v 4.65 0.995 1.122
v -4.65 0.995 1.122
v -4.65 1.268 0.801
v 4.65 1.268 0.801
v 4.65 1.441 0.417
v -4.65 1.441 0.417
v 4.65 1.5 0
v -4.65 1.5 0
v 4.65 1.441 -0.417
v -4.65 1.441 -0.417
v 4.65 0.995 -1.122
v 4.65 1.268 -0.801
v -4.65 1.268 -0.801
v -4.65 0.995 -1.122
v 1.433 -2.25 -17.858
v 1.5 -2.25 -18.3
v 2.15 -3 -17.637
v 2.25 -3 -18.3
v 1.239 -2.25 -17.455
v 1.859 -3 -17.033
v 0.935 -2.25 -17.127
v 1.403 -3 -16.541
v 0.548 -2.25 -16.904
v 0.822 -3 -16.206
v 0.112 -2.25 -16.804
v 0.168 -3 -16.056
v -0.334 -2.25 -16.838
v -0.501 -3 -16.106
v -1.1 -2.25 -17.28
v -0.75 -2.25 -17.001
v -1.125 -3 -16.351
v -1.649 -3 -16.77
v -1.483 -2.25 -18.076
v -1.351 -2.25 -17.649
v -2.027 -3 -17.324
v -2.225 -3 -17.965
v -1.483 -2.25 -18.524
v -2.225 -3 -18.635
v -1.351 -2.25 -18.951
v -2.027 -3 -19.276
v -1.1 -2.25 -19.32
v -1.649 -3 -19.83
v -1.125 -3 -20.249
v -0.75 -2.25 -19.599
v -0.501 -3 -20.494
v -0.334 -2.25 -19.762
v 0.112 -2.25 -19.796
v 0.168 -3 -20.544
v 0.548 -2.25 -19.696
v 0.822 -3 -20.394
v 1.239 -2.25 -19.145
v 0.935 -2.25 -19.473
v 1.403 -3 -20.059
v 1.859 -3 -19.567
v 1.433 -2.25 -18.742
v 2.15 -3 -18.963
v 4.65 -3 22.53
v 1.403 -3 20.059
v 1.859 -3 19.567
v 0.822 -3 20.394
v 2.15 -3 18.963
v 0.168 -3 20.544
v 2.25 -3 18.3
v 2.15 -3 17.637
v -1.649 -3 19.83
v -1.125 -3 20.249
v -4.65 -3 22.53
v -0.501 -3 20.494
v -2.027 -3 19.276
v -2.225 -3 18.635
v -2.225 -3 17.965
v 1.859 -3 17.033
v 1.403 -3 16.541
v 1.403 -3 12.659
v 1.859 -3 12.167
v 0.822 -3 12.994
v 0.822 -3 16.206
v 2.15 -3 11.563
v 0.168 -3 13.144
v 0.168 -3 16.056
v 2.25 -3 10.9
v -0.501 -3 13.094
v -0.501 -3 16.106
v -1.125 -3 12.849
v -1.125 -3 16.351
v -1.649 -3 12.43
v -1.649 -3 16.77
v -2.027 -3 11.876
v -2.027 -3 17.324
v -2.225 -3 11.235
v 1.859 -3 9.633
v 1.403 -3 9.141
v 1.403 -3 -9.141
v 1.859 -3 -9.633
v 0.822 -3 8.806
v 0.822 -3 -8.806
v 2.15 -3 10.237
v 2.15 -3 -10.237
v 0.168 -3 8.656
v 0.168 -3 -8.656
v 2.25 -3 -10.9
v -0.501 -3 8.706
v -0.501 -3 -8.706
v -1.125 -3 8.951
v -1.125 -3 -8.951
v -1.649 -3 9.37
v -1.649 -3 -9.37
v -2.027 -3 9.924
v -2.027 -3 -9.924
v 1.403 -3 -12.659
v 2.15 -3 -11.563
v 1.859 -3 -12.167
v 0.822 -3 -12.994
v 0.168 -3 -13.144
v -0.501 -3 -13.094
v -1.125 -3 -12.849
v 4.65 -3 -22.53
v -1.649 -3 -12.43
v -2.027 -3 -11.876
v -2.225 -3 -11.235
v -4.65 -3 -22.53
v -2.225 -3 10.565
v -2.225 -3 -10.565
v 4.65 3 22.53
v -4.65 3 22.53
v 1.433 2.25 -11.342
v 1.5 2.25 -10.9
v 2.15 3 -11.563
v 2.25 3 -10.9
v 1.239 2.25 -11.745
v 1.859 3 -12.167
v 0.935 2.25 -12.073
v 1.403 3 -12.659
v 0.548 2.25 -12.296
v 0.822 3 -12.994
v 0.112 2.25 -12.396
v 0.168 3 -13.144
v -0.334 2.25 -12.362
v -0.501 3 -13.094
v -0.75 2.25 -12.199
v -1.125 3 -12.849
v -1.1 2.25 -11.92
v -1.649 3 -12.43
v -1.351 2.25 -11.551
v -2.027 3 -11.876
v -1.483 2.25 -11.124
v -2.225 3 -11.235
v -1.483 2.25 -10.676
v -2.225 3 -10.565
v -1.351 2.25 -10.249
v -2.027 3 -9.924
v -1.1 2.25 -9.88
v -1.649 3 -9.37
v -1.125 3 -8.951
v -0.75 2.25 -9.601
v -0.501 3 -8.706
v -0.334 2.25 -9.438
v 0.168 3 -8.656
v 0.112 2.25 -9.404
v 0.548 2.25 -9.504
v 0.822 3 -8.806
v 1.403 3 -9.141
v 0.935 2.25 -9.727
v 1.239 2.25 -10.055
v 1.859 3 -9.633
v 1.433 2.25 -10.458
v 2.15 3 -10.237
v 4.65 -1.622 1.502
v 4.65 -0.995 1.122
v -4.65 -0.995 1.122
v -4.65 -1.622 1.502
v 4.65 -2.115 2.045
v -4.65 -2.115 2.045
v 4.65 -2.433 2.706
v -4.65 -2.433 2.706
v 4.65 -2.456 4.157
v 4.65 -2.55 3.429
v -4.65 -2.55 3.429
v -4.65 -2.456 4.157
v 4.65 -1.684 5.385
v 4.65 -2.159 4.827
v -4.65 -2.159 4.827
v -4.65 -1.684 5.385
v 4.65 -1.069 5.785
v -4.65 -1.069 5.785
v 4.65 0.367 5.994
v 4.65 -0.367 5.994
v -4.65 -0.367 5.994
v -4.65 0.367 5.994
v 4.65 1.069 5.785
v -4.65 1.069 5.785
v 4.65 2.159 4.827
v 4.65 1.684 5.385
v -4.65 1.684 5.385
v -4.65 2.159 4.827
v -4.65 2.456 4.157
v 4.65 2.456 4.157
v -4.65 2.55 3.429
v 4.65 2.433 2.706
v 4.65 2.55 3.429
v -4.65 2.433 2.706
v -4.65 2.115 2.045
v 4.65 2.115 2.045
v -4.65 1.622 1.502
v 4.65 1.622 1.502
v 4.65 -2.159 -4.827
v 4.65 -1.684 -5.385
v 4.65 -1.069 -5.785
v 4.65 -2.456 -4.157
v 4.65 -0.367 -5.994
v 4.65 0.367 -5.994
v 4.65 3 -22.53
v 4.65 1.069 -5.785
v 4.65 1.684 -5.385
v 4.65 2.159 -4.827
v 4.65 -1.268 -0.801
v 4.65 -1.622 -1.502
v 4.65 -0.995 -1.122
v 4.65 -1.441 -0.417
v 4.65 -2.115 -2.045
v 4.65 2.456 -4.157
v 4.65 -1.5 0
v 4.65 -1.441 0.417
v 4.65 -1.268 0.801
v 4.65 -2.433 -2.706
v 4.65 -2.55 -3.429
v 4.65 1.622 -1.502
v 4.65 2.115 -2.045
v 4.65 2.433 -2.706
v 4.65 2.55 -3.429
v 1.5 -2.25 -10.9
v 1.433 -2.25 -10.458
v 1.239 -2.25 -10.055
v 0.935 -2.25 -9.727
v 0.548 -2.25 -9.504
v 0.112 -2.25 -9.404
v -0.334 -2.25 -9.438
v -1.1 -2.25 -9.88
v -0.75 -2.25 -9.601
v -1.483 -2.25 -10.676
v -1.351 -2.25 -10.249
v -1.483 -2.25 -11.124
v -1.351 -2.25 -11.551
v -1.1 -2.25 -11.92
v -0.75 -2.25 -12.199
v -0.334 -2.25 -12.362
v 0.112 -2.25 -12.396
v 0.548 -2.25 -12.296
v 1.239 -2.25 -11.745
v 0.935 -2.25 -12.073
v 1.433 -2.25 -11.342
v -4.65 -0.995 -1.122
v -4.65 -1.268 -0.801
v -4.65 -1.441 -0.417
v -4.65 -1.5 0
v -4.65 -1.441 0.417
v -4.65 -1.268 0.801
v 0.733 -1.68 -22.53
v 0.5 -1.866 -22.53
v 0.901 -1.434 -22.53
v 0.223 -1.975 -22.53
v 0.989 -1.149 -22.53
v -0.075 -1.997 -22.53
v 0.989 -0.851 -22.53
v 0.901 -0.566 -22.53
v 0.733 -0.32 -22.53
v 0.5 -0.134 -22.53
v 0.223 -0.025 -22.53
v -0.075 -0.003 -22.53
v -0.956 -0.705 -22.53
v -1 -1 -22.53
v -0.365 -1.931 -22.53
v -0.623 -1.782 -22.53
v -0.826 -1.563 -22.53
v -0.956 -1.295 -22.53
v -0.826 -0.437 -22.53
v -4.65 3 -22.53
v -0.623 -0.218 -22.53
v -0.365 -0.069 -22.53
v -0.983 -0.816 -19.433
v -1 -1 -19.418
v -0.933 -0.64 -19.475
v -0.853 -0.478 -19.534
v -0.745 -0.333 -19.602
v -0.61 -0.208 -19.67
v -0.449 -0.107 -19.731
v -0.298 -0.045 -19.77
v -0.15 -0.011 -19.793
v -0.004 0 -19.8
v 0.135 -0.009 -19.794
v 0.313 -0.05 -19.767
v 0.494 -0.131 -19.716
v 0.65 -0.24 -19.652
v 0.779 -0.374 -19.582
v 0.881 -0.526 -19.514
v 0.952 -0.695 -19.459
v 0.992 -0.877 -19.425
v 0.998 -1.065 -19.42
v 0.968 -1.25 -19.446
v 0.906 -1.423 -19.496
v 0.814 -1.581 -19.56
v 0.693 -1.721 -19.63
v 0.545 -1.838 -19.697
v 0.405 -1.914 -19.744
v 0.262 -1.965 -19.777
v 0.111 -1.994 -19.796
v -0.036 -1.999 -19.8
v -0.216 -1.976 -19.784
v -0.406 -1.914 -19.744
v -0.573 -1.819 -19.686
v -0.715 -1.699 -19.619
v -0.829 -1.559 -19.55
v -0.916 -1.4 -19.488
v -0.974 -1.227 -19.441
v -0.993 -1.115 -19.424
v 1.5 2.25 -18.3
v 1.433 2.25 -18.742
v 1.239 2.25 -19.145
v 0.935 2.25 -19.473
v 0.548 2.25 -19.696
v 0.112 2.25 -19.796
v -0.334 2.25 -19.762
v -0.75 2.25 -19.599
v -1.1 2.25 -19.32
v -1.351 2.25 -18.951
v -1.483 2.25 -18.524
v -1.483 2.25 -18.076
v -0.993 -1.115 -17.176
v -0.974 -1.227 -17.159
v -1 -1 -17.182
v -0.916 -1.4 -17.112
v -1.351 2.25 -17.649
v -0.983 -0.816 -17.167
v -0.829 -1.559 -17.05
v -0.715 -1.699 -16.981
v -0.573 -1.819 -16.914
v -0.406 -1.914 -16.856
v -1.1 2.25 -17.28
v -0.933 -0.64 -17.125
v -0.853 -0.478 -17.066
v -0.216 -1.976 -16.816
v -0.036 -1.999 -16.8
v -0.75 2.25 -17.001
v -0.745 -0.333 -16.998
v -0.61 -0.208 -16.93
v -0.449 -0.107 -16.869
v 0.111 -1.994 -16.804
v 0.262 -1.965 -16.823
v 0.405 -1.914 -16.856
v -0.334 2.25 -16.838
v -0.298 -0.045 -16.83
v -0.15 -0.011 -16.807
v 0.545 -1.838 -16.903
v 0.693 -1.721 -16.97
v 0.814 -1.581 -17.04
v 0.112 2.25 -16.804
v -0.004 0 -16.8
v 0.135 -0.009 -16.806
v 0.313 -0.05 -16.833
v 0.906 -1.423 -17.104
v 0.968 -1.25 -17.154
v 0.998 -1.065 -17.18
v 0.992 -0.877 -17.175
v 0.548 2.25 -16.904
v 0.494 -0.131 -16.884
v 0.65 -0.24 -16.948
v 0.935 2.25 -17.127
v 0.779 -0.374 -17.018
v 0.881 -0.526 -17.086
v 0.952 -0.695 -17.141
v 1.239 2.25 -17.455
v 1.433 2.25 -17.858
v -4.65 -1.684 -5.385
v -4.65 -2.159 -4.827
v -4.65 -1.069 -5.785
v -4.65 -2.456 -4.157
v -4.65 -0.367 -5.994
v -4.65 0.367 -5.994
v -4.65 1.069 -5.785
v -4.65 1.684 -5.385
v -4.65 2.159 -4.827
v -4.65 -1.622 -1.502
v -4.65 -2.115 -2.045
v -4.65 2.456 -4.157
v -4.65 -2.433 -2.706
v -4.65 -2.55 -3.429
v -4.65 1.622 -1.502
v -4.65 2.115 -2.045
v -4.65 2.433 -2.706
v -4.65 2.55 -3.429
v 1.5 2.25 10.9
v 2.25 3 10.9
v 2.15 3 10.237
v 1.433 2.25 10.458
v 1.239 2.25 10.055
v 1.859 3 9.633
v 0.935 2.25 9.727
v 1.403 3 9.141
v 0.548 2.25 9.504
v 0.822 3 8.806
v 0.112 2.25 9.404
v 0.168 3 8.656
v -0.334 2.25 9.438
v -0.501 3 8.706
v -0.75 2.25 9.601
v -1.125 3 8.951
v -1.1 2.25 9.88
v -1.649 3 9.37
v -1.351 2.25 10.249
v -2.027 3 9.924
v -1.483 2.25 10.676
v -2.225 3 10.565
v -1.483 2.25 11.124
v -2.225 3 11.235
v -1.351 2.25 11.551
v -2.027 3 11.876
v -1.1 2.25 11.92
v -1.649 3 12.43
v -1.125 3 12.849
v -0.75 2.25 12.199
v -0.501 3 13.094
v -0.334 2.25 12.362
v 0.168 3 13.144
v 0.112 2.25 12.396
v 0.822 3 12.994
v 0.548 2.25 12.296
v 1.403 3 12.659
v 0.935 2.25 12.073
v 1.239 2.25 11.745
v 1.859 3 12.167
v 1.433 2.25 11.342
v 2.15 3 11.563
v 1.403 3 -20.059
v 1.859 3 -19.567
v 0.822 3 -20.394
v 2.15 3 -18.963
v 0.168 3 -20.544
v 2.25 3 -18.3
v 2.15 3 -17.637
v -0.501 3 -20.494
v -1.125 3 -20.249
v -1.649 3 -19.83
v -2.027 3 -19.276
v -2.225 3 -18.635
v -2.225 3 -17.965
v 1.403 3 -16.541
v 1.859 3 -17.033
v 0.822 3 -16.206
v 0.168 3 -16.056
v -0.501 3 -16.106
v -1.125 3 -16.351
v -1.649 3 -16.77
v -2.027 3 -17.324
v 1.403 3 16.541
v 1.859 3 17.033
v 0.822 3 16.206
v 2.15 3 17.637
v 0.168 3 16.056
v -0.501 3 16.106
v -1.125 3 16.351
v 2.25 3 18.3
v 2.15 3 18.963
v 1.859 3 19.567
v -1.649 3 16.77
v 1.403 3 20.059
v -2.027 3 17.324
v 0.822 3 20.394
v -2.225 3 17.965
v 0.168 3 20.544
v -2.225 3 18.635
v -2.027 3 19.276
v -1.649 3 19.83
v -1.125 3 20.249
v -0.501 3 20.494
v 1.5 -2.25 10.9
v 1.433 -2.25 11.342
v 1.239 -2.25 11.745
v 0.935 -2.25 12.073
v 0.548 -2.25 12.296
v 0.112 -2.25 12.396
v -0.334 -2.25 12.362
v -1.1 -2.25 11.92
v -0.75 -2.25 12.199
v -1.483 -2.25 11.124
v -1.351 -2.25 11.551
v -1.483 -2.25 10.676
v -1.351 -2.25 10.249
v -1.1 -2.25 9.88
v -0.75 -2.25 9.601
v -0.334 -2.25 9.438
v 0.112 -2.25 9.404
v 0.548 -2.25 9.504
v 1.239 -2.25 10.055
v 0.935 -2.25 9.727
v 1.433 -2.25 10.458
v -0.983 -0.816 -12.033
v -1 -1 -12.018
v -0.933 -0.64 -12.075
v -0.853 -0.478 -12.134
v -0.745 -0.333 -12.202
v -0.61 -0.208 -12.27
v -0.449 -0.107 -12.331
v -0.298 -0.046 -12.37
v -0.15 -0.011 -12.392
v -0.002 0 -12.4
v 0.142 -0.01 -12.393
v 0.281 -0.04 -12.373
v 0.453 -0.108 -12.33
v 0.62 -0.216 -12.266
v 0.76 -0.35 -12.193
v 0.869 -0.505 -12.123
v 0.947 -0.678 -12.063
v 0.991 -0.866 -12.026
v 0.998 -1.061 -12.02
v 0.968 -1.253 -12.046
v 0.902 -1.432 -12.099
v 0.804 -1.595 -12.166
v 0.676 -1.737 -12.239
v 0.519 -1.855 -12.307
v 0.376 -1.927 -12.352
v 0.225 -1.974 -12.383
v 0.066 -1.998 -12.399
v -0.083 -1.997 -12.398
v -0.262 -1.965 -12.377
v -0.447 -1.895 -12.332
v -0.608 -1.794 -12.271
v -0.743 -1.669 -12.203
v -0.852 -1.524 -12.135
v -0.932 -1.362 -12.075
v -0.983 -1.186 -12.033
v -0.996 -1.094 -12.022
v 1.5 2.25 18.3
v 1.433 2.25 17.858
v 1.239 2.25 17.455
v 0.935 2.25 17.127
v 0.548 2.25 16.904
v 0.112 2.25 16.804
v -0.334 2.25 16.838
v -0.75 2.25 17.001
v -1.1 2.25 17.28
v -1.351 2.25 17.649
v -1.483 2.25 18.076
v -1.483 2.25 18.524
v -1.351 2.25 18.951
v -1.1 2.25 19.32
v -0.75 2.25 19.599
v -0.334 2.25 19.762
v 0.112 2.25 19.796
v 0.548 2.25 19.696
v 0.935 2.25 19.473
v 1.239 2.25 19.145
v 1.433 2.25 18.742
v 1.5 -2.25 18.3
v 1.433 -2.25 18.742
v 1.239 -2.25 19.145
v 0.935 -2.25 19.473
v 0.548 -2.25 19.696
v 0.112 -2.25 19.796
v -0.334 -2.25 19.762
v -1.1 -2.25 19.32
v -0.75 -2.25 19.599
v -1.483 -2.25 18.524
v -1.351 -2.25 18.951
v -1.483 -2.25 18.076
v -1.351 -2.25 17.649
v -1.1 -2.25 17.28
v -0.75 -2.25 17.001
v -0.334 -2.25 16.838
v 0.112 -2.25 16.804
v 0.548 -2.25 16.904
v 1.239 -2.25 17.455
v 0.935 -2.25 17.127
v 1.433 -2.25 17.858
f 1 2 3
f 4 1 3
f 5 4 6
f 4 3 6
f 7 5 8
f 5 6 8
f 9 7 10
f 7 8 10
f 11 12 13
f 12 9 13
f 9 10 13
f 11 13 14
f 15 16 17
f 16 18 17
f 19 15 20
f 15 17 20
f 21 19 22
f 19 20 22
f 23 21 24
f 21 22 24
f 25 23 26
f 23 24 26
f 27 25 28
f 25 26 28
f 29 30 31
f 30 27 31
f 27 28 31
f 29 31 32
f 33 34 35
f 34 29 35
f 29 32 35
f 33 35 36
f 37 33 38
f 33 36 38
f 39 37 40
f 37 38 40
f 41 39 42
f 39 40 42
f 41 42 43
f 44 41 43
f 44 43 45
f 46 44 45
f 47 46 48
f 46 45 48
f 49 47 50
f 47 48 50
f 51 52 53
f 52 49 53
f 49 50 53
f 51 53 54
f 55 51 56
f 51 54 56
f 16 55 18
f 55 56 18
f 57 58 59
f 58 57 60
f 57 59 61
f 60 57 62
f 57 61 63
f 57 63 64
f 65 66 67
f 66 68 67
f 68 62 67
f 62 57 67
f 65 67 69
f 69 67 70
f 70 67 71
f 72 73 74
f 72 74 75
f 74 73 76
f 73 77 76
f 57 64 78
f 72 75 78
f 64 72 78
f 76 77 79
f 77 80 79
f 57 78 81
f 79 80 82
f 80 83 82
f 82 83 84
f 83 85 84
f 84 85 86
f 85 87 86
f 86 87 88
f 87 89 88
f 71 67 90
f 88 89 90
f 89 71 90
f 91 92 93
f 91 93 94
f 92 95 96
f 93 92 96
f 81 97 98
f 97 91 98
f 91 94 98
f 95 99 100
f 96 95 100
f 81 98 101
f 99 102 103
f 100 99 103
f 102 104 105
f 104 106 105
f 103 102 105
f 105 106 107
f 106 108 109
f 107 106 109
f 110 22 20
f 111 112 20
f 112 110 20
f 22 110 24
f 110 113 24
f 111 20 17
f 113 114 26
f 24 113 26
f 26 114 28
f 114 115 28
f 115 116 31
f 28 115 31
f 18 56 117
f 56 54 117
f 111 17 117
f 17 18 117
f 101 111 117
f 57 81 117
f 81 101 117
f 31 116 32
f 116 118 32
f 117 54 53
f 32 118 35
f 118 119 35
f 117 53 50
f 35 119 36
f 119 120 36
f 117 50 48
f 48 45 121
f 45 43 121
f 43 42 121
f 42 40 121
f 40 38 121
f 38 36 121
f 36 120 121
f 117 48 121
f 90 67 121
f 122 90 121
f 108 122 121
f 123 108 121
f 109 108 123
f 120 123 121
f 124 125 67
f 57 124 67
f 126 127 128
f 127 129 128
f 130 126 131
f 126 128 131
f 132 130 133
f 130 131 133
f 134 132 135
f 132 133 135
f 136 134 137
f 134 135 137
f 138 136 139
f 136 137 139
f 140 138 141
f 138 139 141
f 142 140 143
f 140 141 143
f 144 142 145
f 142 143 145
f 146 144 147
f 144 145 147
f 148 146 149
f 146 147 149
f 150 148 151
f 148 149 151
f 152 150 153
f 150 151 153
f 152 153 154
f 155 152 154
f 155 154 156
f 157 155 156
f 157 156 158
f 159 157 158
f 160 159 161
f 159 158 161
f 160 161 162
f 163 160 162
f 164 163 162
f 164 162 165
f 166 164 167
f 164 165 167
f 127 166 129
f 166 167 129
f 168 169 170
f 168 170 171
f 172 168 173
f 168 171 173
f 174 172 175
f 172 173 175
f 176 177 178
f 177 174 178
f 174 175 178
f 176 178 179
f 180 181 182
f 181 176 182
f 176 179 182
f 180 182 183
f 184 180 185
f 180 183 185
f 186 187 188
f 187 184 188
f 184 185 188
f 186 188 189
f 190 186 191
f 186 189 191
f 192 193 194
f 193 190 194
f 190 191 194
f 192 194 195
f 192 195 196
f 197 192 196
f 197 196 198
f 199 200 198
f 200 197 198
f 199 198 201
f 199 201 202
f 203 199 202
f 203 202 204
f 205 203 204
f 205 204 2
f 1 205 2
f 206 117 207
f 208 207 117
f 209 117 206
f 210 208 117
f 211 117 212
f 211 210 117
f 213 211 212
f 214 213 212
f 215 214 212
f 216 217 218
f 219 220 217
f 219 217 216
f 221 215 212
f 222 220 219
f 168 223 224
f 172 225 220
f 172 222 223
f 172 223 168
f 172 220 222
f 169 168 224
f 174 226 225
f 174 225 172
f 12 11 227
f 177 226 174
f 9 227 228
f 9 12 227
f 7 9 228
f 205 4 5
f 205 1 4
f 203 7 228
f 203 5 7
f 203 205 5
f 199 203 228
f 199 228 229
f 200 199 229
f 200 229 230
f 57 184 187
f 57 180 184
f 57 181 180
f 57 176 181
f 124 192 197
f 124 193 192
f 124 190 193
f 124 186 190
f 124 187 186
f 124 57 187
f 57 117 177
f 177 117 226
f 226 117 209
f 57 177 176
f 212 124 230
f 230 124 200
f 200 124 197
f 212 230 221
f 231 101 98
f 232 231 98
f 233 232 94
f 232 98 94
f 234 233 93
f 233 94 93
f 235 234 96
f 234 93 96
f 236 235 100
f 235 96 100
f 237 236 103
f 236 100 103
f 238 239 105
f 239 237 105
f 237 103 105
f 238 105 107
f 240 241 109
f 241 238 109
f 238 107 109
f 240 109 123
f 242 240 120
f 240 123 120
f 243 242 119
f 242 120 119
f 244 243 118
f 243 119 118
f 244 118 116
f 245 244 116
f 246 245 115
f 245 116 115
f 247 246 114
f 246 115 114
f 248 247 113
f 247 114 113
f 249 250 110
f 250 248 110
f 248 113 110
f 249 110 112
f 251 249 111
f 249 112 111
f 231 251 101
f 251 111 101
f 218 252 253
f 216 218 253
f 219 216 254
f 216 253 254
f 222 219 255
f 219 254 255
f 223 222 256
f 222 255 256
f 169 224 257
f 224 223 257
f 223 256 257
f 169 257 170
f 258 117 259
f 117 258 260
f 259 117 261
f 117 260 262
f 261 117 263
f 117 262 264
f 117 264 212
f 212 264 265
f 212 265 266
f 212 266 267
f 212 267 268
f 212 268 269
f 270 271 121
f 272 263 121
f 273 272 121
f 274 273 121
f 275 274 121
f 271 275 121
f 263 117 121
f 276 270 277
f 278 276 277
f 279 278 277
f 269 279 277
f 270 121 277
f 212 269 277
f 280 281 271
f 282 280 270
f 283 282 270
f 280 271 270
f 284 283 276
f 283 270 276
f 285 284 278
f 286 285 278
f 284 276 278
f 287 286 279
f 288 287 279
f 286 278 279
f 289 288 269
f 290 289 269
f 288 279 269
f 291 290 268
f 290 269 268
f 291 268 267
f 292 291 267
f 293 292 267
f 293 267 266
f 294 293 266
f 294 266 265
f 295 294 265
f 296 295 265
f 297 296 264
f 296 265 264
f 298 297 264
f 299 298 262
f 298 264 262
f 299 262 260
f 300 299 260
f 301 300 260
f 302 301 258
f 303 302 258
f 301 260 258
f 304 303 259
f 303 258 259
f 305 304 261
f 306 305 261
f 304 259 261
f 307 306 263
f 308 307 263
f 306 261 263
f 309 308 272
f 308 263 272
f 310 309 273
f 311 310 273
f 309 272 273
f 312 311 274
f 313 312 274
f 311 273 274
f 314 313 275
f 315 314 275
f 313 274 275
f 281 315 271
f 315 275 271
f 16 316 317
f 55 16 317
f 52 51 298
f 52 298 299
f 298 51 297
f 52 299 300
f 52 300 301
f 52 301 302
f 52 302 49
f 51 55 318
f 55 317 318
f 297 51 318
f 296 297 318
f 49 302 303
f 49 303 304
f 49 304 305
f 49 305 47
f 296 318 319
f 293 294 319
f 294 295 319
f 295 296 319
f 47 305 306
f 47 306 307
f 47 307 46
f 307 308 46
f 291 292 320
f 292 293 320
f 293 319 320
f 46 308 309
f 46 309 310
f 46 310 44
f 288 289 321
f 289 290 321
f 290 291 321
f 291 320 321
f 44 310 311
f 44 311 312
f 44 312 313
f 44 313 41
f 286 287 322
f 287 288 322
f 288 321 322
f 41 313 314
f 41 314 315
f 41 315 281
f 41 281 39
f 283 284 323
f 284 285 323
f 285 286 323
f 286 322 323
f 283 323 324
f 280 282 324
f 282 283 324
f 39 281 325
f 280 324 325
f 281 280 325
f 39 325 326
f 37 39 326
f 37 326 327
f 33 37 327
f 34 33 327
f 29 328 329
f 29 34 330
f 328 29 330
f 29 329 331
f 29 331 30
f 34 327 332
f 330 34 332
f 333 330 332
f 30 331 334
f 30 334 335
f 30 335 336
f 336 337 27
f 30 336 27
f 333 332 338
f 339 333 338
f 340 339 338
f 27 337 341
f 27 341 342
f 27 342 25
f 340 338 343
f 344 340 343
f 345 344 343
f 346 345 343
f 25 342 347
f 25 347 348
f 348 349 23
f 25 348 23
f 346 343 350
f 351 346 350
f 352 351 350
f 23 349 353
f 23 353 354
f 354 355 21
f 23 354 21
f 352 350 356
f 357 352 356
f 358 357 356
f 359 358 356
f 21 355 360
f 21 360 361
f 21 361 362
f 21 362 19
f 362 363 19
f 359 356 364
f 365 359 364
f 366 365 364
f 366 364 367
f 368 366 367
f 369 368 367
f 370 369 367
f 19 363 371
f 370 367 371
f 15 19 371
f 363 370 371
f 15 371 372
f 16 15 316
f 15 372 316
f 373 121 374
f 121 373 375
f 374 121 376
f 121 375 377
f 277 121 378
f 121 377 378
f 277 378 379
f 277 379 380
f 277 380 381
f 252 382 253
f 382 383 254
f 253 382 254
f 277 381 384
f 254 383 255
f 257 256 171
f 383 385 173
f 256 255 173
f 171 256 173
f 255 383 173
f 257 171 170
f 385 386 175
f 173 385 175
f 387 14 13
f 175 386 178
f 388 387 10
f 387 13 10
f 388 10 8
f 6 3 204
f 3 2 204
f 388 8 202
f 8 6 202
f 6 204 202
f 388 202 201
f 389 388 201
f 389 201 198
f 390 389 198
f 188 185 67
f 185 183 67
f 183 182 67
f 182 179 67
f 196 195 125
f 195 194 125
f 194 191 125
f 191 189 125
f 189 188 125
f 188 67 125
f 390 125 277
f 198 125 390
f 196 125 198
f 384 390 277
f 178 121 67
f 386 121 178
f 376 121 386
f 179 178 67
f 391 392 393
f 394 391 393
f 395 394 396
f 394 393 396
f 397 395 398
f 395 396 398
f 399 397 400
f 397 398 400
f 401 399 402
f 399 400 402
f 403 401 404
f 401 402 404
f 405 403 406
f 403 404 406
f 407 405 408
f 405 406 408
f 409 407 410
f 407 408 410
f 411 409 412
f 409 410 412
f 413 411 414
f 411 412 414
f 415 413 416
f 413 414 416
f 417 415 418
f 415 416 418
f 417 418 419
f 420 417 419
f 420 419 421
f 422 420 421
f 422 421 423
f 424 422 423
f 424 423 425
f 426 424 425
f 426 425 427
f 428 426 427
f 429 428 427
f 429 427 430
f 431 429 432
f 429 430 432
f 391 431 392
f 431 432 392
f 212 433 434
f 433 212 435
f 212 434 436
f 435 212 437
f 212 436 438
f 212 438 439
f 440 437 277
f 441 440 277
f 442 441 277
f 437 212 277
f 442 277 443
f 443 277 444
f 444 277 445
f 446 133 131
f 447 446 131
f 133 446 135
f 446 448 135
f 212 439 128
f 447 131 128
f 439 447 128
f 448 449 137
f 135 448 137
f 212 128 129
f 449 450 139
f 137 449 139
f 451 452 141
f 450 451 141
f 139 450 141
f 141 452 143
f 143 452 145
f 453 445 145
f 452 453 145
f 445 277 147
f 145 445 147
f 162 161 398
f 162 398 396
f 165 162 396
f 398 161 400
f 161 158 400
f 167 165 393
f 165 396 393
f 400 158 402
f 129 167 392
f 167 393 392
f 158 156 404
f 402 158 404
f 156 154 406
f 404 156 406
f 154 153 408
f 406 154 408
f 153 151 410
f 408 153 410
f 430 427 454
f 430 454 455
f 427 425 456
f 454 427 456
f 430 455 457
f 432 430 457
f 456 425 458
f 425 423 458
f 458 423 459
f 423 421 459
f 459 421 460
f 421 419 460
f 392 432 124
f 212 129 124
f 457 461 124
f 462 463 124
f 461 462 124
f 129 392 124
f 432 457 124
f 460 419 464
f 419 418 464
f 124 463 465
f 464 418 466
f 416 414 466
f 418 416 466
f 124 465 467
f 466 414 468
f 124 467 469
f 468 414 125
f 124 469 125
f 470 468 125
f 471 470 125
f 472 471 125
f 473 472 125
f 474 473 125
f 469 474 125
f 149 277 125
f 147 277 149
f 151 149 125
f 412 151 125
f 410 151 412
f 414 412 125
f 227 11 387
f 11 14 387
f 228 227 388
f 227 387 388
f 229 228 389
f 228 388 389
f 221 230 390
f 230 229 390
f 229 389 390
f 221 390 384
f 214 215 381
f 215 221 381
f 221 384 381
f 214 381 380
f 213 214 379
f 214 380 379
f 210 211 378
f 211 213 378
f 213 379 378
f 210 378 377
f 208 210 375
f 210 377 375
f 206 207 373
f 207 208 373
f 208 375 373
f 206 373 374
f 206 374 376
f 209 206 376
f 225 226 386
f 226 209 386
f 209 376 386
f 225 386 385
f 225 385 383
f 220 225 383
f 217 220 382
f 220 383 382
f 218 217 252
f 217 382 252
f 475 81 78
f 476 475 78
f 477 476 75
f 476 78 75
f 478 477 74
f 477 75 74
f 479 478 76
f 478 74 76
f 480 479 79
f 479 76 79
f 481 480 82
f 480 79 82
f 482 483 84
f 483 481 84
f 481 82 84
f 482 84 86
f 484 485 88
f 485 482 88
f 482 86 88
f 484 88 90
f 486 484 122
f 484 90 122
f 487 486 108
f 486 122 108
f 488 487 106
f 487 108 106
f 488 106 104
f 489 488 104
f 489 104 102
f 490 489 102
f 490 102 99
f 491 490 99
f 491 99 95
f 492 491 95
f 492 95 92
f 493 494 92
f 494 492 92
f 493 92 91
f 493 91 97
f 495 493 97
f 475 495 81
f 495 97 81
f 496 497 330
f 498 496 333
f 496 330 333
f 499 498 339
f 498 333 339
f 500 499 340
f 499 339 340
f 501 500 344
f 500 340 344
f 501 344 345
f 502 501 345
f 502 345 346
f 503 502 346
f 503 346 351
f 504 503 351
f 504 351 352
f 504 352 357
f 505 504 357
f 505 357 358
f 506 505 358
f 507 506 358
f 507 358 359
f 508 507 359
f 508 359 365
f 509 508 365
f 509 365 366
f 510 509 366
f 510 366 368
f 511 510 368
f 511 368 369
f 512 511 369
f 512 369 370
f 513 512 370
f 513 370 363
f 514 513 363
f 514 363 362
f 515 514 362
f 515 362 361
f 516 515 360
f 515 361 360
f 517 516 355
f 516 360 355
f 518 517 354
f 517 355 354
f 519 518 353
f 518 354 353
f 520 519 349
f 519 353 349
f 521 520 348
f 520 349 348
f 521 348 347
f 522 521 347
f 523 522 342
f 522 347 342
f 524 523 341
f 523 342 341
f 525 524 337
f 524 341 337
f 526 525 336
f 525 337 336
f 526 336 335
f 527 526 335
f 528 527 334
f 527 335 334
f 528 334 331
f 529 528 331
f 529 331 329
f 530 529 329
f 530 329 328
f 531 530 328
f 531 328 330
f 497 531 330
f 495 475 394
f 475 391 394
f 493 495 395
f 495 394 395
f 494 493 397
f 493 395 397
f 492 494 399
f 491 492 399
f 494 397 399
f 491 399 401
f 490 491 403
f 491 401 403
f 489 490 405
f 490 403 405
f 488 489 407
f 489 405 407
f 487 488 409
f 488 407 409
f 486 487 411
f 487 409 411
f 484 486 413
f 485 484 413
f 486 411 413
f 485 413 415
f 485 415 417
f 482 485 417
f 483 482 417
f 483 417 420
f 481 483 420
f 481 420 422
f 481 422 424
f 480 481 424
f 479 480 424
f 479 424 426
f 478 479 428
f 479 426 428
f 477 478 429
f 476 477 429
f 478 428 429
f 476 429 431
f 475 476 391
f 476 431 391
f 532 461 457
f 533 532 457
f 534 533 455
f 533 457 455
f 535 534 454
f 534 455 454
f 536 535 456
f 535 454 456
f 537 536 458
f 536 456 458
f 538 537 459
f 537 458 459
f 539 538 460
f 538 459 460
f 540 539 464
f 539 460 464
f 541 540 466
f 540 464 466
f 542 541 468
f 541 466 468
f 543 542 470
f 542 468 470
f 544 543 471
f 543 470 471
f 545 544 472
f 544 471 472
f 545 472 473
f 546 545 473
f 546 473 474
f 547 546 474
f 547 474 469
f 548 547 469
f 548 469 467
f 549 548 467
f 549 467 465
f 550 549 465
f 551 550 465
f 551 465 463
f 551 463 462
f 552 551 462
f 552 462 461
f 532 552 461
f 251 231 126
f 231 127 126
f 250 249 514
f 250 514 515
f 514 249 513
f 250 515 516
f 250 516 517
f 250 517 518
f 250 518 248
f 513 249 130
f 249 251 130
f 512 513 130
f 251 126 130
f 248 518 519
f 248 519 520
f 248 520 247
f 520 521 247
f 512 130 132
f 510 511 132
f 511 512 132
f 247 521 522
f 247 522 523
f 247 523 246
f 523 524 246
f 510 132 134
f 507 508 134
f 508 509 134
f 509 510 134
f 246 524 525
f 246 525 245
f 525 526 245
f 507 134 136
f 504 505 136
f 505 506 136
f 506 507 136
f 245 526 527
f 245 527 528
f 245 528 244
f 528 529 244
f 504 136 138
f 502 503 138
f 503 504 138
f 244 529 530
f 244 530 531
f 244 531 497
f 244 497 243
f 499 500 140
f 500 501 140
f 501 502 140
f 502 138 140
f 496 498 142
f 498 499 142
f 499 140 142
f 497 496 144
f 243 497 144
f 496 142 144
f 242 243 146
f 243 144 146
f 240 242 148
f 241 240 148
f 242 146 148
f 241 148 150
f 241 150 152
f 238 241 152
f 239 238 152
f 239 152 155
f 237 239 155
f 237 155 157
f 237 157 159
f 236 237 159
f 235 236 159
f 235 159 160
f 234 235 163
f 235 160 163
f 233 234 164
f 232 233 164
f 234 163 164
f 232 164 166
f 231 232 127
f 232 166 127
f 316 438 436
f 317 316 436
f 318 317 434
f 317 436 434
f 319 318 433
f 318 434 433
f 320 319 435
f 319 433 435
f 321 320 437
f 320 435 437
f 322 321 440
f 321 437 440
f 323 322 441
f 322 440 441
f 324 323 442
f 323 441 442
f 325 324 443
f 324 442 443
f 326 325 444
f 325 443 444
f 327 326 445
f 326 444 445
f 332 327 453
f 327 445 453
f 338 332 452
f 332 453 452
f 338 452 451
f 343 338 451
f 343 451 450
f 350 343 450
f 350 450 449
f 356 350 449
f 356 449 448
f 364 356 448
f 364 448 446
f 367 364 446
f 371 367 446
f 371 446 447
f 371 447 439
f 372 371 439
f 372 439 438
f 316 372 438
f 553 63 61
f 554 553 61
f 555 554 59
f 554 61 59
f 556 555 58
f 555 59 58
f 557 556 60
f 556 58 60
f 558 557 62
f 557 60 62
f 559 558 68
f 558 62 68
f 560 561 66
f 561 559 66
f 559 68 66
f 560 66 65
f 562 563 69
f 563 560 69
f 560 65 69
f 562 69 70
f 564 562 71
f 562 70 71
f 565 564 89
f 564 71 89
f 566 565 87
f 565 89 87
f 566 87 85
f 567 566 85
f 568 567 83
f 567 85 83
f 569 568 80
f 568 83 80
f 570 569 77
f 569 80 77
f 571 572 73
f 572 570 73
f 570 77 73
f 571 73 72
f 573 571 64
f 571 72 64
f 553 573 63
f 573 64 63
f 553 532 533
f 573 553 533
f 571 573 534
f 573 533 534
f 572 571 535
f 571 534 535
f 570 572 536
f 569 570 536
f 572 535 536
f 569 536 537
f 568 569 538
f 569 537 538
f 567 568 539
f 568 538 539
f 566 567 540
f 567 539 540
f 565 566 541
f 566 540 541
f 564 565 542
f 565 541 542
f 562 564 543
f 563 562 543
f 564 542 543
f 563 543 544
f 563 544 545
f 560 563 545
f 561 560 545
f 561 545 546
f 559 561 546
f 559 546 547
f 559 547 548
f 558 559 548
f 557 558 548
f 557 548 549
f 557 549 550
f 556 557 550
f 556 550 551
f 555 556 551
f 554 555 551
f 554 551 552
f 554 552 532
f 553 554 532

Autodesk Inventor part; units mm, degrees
ref_plane "YZ Plane" through (0, 0, 0) normal (1, 0, 0) x (0, 1, 0)
ref_plane "XZ Plane" through (0, 0, 0) normal (0, 1, 0) x (-1, 0, 0)
ref_plane "XY Plane" through (0, 0, 0) normal (0, 0, 1) x (1, 0, 0)
sketch "スケッチ1" plane through (0, 0, 0) normal (1, 0, 0) x (0, 1, 0)
  line L0 (3, 22.53) -> (-3, 22.53)
  line L1 (-3, 22.53) -> (-3, -22.53)
  line L2 (-3, -22.53) -> (3, -22.53)
  line L3 (3, -22.53) -> (3, 22.53)
  line L4 (0, 22.53) -> (0, -22.53) construction
  line L5 (3, 0) -> (-3, 0) construction
  arc A0 (0.9953, 1.1222) -> (-0.9953, 1.1222) centre (0, 3.47) ccw
  arc A1 (-0.9953, -1.1222) -> (0.9953, -1.1222) centre (0, -3.47) ccw
  arc A2 (-0.9953, 1.1222) -> (-0.9953, -1.1222) centre (0, 0) ccw
  arc A3 (0.9953, -1.1222) -> (0.9953, 1.1222) centre (0, 0) ccw
  dimension "d0" = 6
  dimension "d1" = 45.06
  dimension "d3" = 5.1
  dimension "d4" = 12.04
  dimension "d5" = 1.5
extrude "押し出し1" add sketch "スケッチ1" along normal mid plane 9.3
sketch "スケッチ2" plane through (-4.65, 3, 22.53) normal (0, 1, 0) x (1, 0, 0)
  line L0 (4.65, 0) -> (4.65, 45.06) construction
  line L1 (9.3, 0) -> (0, 0) construction
  circle A0 centre (4.65, 4.23) radius 1.5
  circle A1 centre (4.65, 11.63) radius 1.5
  line L2 (9.3, 23.6522) -> (9.3, 21.4078) construction
  line L3 (9.3, 22.53) -> (-0.0401, 22.53) construction
  line L4 (9.3, 45.06) -> (0, 45.06) construction
  circle A2 centre (4.65, 40.83) radius 1.5
  circle A3 centre (4.65, 33.43) radius 1.5
  point P0 (4.65, 22.53)
  dimension "d8" = 21.8
  dimension "d9" = 7.4
  dimension "d10" = 3
extrude "押し出し2" cut sketch "スケッチ2" against normal blind 6
chamfer "面取り1" distance 0.75 angle 45 8 edges at (-1.5, 3, 18.3) (-1.5, 3, 10.9) (-1.5, 3, -10.9) (-1.5, 3, -18.3) (-1.5, -3, 18.3) (-1.5, -3, 10.9) (-1.5, -3, -10.9) (-1.5, -3, -18.3)
sketch "スケッチ4" plane through (4.65, 3, -22.53) normal (0, 0, -1) x (-1, 0, 0)
  line L0 (4.65, -3) -> (4.65, -4) construction
  circle A0 centre (4.65, -4) radius 1
  line L1 (9.3, 0) -> (0, 0) construction
  dimension "d19" = 2
  dimension "d20" = 1
  dimension "d21" = 3
extrude "押し出し4" cut sketch "スケッチ4" against normal blind 11.5
properties part number "20_020_LOAD_CELL_R2" material "アルミニウム 6061"
